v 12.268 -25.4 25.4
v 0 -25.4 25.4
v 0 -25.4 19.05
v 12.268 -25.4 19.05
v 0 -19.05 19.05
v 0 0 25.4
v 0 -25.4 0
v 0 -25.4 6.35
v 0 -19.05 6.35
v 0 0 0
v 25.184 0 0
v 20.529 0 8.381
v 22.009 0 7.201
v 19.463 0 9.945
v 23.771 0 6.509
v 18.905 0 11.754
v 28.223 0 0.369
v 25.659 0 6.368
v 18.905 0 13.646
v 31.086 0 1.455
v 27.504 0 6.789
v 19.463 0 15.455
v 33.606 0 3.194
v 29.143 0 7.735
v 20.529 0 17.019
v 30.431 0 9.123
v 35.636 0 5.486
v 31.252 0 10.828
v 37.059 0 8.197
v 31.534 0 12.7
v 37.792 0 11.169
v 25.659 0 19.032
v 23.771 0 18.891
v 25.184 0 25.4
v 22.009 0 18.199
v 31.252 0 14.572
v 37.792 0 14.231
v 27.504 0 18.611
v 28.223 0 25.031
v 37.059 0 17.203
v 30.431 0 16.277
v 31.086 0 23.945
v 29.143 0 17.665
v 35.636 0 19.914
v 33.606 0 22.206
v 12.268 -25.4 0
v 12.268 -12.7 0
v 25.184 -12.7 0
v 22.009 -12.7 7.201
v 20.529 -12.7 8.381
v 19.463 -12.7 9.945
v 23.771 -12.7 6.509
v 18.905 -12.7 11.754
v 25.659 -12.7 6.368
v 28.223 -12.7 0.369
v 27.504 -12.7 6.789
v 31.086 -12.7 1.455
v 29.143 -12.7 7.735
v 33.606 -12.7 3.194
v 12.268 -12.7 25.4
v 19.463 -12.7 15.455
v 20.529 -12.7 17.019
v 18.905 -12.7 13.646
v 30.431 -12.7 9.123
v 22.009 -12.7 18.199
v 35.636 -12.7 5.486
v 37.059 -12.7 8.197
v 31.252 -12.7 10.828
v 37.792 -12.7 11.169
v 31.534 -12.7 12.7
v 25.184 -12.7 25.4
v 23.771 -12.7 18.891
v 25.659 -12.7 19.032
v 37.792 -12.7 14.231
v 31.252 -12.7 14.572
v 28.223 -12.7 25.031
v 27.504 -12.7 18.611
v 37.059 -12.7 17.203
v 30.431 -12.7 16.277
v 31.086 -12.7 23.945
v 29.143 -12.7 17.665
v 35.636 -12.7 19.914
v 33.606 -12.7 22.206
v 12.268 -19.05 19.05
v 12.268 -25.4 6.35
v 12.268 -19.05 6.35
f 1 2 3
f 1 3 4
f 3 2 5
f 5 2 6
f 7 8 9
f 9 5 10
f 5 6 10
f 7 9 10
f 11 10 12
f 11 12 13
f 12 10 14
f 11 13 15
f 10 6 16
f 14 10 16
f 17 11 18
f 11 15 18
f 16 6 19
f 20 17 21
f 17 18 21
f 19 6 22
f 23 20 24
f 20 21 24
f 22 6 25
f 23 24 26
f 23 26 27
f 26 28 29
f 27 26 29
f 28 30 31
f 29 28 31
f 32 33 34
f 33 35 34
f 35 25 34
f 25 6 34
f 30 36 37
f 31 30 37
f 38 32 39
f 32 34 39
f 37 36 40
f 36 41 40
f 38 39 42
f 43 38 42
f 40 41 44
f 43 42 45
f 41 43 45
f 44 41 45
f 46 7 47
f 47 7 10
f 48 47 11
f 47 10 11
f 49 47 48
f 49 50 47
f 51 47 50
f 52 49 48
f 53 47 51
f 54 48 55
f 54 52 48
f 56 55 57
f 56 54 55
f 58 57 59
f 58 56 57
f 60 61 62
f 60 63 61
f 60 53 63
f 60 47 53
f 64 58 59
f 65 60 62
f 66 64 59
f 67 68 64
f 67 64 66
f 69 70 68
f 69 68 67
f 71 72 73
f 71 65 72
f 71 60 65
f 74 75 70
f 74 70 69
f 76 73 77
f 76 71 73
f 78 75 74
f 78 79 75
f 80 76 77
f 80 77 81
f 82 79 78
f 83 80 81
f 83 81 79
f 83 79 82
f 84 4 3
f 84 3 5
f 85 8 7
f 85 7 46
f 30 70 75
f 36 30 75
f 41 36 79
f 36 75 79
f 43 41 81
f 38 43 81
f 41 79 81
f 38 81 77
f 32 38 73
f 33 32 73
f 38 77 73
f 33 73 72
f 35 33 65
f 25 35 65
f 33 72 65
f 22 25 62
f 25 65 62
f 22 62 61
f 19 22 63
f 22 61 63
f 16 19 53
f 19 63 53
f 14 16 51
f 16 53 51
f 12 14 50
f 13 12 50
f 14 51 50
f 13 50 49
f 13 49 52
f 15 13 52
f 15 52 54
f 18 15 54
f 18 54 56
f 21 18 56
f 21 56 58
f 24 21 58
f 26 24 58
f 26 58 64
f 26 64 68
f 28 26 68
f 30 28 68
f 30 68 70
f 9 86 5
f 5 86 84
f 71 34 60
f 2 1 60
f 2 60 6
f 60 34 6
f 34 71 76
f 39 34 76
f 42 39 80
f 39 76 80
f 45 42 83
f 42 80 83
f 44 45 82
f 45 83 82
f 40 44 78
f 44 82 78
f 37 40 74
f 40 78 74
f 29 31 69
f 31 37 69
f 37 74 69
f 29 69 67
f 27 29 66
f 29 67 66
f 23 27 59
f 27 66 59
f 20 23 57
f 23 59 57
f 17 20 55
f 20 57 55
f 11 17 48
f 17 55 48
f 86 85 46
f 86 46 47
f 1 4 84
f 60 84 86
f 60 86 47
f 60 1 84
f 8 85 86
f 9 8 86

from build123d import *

# Parameters (mm, degrees)
F1_DEPTH = 25.4
F2_W     = 25.8318
F2_H     = 12.7
F3_DEPTH = 25.4
F5_DEPTH = 25.4
F6_W     = 6.35
F6_H     = 12.7
F7_DEPTH = 25.4
F8_R     = 6.35
F9_DEPTH = 25.4


with BuildPart() as f1:
    # F0 (on Front) → F1 (new body)
    with BuildSketch(Plane.XZ):
        Polygon((0, 25.4), (0, 0), (38.1, 0), (38.1, 25.4), (12.7, 25.4), align=None)
    extrude(amount=F1_DEPTH)

    # F2 (on face) → F3 (cut)
    with BuildSketch(Plane.XY.offset(25.4)):
        with Locations((25.1841, -19.05)):
            Rectangle(F2_W, F2_H)
    extrude(amount=-F3_DEPTH, mode=Mode.SUBTRACT)

    # F4 (on face) → F5 (cut)
    with BuildSketch(Plane.XZ.offset(12.7)):
        with BuildLine():
            Line((38.1, 25.4), (25.1841, 25.4))
            ThreePointArc((25.1841, 25.4), (37.8841, 12.7), (25.1841, 0))
            Line((25.1841, 0), (38.1, 0))
            Line((38.1, 0), (38.1, 25.4))
        make_face()
    extrude(amount=-F5_DEPTH, mode=Mode.SUBTRACT)

    # F6 (on face) → F7 (cut)
    with BuildSketch(Plane.YZ.offset(12.2682)):
        with Locations((-22.225, 12.7)):
            Rectangle(F6_W, F6_H)
    extrude(amount=-F7_DEPTH, mode=Mode.SUBTRACT)

    # F8 (on face) → F9 (cut)
    with BuildSketch(Plane.XZ.offset(12.7)):
        with Locations((25.1841, 12.7)):
            Circle(F8_R)
    extrude(amount=-F9_DEPTH, mode=Mode.SUBTRACT)


solid = f1.part
